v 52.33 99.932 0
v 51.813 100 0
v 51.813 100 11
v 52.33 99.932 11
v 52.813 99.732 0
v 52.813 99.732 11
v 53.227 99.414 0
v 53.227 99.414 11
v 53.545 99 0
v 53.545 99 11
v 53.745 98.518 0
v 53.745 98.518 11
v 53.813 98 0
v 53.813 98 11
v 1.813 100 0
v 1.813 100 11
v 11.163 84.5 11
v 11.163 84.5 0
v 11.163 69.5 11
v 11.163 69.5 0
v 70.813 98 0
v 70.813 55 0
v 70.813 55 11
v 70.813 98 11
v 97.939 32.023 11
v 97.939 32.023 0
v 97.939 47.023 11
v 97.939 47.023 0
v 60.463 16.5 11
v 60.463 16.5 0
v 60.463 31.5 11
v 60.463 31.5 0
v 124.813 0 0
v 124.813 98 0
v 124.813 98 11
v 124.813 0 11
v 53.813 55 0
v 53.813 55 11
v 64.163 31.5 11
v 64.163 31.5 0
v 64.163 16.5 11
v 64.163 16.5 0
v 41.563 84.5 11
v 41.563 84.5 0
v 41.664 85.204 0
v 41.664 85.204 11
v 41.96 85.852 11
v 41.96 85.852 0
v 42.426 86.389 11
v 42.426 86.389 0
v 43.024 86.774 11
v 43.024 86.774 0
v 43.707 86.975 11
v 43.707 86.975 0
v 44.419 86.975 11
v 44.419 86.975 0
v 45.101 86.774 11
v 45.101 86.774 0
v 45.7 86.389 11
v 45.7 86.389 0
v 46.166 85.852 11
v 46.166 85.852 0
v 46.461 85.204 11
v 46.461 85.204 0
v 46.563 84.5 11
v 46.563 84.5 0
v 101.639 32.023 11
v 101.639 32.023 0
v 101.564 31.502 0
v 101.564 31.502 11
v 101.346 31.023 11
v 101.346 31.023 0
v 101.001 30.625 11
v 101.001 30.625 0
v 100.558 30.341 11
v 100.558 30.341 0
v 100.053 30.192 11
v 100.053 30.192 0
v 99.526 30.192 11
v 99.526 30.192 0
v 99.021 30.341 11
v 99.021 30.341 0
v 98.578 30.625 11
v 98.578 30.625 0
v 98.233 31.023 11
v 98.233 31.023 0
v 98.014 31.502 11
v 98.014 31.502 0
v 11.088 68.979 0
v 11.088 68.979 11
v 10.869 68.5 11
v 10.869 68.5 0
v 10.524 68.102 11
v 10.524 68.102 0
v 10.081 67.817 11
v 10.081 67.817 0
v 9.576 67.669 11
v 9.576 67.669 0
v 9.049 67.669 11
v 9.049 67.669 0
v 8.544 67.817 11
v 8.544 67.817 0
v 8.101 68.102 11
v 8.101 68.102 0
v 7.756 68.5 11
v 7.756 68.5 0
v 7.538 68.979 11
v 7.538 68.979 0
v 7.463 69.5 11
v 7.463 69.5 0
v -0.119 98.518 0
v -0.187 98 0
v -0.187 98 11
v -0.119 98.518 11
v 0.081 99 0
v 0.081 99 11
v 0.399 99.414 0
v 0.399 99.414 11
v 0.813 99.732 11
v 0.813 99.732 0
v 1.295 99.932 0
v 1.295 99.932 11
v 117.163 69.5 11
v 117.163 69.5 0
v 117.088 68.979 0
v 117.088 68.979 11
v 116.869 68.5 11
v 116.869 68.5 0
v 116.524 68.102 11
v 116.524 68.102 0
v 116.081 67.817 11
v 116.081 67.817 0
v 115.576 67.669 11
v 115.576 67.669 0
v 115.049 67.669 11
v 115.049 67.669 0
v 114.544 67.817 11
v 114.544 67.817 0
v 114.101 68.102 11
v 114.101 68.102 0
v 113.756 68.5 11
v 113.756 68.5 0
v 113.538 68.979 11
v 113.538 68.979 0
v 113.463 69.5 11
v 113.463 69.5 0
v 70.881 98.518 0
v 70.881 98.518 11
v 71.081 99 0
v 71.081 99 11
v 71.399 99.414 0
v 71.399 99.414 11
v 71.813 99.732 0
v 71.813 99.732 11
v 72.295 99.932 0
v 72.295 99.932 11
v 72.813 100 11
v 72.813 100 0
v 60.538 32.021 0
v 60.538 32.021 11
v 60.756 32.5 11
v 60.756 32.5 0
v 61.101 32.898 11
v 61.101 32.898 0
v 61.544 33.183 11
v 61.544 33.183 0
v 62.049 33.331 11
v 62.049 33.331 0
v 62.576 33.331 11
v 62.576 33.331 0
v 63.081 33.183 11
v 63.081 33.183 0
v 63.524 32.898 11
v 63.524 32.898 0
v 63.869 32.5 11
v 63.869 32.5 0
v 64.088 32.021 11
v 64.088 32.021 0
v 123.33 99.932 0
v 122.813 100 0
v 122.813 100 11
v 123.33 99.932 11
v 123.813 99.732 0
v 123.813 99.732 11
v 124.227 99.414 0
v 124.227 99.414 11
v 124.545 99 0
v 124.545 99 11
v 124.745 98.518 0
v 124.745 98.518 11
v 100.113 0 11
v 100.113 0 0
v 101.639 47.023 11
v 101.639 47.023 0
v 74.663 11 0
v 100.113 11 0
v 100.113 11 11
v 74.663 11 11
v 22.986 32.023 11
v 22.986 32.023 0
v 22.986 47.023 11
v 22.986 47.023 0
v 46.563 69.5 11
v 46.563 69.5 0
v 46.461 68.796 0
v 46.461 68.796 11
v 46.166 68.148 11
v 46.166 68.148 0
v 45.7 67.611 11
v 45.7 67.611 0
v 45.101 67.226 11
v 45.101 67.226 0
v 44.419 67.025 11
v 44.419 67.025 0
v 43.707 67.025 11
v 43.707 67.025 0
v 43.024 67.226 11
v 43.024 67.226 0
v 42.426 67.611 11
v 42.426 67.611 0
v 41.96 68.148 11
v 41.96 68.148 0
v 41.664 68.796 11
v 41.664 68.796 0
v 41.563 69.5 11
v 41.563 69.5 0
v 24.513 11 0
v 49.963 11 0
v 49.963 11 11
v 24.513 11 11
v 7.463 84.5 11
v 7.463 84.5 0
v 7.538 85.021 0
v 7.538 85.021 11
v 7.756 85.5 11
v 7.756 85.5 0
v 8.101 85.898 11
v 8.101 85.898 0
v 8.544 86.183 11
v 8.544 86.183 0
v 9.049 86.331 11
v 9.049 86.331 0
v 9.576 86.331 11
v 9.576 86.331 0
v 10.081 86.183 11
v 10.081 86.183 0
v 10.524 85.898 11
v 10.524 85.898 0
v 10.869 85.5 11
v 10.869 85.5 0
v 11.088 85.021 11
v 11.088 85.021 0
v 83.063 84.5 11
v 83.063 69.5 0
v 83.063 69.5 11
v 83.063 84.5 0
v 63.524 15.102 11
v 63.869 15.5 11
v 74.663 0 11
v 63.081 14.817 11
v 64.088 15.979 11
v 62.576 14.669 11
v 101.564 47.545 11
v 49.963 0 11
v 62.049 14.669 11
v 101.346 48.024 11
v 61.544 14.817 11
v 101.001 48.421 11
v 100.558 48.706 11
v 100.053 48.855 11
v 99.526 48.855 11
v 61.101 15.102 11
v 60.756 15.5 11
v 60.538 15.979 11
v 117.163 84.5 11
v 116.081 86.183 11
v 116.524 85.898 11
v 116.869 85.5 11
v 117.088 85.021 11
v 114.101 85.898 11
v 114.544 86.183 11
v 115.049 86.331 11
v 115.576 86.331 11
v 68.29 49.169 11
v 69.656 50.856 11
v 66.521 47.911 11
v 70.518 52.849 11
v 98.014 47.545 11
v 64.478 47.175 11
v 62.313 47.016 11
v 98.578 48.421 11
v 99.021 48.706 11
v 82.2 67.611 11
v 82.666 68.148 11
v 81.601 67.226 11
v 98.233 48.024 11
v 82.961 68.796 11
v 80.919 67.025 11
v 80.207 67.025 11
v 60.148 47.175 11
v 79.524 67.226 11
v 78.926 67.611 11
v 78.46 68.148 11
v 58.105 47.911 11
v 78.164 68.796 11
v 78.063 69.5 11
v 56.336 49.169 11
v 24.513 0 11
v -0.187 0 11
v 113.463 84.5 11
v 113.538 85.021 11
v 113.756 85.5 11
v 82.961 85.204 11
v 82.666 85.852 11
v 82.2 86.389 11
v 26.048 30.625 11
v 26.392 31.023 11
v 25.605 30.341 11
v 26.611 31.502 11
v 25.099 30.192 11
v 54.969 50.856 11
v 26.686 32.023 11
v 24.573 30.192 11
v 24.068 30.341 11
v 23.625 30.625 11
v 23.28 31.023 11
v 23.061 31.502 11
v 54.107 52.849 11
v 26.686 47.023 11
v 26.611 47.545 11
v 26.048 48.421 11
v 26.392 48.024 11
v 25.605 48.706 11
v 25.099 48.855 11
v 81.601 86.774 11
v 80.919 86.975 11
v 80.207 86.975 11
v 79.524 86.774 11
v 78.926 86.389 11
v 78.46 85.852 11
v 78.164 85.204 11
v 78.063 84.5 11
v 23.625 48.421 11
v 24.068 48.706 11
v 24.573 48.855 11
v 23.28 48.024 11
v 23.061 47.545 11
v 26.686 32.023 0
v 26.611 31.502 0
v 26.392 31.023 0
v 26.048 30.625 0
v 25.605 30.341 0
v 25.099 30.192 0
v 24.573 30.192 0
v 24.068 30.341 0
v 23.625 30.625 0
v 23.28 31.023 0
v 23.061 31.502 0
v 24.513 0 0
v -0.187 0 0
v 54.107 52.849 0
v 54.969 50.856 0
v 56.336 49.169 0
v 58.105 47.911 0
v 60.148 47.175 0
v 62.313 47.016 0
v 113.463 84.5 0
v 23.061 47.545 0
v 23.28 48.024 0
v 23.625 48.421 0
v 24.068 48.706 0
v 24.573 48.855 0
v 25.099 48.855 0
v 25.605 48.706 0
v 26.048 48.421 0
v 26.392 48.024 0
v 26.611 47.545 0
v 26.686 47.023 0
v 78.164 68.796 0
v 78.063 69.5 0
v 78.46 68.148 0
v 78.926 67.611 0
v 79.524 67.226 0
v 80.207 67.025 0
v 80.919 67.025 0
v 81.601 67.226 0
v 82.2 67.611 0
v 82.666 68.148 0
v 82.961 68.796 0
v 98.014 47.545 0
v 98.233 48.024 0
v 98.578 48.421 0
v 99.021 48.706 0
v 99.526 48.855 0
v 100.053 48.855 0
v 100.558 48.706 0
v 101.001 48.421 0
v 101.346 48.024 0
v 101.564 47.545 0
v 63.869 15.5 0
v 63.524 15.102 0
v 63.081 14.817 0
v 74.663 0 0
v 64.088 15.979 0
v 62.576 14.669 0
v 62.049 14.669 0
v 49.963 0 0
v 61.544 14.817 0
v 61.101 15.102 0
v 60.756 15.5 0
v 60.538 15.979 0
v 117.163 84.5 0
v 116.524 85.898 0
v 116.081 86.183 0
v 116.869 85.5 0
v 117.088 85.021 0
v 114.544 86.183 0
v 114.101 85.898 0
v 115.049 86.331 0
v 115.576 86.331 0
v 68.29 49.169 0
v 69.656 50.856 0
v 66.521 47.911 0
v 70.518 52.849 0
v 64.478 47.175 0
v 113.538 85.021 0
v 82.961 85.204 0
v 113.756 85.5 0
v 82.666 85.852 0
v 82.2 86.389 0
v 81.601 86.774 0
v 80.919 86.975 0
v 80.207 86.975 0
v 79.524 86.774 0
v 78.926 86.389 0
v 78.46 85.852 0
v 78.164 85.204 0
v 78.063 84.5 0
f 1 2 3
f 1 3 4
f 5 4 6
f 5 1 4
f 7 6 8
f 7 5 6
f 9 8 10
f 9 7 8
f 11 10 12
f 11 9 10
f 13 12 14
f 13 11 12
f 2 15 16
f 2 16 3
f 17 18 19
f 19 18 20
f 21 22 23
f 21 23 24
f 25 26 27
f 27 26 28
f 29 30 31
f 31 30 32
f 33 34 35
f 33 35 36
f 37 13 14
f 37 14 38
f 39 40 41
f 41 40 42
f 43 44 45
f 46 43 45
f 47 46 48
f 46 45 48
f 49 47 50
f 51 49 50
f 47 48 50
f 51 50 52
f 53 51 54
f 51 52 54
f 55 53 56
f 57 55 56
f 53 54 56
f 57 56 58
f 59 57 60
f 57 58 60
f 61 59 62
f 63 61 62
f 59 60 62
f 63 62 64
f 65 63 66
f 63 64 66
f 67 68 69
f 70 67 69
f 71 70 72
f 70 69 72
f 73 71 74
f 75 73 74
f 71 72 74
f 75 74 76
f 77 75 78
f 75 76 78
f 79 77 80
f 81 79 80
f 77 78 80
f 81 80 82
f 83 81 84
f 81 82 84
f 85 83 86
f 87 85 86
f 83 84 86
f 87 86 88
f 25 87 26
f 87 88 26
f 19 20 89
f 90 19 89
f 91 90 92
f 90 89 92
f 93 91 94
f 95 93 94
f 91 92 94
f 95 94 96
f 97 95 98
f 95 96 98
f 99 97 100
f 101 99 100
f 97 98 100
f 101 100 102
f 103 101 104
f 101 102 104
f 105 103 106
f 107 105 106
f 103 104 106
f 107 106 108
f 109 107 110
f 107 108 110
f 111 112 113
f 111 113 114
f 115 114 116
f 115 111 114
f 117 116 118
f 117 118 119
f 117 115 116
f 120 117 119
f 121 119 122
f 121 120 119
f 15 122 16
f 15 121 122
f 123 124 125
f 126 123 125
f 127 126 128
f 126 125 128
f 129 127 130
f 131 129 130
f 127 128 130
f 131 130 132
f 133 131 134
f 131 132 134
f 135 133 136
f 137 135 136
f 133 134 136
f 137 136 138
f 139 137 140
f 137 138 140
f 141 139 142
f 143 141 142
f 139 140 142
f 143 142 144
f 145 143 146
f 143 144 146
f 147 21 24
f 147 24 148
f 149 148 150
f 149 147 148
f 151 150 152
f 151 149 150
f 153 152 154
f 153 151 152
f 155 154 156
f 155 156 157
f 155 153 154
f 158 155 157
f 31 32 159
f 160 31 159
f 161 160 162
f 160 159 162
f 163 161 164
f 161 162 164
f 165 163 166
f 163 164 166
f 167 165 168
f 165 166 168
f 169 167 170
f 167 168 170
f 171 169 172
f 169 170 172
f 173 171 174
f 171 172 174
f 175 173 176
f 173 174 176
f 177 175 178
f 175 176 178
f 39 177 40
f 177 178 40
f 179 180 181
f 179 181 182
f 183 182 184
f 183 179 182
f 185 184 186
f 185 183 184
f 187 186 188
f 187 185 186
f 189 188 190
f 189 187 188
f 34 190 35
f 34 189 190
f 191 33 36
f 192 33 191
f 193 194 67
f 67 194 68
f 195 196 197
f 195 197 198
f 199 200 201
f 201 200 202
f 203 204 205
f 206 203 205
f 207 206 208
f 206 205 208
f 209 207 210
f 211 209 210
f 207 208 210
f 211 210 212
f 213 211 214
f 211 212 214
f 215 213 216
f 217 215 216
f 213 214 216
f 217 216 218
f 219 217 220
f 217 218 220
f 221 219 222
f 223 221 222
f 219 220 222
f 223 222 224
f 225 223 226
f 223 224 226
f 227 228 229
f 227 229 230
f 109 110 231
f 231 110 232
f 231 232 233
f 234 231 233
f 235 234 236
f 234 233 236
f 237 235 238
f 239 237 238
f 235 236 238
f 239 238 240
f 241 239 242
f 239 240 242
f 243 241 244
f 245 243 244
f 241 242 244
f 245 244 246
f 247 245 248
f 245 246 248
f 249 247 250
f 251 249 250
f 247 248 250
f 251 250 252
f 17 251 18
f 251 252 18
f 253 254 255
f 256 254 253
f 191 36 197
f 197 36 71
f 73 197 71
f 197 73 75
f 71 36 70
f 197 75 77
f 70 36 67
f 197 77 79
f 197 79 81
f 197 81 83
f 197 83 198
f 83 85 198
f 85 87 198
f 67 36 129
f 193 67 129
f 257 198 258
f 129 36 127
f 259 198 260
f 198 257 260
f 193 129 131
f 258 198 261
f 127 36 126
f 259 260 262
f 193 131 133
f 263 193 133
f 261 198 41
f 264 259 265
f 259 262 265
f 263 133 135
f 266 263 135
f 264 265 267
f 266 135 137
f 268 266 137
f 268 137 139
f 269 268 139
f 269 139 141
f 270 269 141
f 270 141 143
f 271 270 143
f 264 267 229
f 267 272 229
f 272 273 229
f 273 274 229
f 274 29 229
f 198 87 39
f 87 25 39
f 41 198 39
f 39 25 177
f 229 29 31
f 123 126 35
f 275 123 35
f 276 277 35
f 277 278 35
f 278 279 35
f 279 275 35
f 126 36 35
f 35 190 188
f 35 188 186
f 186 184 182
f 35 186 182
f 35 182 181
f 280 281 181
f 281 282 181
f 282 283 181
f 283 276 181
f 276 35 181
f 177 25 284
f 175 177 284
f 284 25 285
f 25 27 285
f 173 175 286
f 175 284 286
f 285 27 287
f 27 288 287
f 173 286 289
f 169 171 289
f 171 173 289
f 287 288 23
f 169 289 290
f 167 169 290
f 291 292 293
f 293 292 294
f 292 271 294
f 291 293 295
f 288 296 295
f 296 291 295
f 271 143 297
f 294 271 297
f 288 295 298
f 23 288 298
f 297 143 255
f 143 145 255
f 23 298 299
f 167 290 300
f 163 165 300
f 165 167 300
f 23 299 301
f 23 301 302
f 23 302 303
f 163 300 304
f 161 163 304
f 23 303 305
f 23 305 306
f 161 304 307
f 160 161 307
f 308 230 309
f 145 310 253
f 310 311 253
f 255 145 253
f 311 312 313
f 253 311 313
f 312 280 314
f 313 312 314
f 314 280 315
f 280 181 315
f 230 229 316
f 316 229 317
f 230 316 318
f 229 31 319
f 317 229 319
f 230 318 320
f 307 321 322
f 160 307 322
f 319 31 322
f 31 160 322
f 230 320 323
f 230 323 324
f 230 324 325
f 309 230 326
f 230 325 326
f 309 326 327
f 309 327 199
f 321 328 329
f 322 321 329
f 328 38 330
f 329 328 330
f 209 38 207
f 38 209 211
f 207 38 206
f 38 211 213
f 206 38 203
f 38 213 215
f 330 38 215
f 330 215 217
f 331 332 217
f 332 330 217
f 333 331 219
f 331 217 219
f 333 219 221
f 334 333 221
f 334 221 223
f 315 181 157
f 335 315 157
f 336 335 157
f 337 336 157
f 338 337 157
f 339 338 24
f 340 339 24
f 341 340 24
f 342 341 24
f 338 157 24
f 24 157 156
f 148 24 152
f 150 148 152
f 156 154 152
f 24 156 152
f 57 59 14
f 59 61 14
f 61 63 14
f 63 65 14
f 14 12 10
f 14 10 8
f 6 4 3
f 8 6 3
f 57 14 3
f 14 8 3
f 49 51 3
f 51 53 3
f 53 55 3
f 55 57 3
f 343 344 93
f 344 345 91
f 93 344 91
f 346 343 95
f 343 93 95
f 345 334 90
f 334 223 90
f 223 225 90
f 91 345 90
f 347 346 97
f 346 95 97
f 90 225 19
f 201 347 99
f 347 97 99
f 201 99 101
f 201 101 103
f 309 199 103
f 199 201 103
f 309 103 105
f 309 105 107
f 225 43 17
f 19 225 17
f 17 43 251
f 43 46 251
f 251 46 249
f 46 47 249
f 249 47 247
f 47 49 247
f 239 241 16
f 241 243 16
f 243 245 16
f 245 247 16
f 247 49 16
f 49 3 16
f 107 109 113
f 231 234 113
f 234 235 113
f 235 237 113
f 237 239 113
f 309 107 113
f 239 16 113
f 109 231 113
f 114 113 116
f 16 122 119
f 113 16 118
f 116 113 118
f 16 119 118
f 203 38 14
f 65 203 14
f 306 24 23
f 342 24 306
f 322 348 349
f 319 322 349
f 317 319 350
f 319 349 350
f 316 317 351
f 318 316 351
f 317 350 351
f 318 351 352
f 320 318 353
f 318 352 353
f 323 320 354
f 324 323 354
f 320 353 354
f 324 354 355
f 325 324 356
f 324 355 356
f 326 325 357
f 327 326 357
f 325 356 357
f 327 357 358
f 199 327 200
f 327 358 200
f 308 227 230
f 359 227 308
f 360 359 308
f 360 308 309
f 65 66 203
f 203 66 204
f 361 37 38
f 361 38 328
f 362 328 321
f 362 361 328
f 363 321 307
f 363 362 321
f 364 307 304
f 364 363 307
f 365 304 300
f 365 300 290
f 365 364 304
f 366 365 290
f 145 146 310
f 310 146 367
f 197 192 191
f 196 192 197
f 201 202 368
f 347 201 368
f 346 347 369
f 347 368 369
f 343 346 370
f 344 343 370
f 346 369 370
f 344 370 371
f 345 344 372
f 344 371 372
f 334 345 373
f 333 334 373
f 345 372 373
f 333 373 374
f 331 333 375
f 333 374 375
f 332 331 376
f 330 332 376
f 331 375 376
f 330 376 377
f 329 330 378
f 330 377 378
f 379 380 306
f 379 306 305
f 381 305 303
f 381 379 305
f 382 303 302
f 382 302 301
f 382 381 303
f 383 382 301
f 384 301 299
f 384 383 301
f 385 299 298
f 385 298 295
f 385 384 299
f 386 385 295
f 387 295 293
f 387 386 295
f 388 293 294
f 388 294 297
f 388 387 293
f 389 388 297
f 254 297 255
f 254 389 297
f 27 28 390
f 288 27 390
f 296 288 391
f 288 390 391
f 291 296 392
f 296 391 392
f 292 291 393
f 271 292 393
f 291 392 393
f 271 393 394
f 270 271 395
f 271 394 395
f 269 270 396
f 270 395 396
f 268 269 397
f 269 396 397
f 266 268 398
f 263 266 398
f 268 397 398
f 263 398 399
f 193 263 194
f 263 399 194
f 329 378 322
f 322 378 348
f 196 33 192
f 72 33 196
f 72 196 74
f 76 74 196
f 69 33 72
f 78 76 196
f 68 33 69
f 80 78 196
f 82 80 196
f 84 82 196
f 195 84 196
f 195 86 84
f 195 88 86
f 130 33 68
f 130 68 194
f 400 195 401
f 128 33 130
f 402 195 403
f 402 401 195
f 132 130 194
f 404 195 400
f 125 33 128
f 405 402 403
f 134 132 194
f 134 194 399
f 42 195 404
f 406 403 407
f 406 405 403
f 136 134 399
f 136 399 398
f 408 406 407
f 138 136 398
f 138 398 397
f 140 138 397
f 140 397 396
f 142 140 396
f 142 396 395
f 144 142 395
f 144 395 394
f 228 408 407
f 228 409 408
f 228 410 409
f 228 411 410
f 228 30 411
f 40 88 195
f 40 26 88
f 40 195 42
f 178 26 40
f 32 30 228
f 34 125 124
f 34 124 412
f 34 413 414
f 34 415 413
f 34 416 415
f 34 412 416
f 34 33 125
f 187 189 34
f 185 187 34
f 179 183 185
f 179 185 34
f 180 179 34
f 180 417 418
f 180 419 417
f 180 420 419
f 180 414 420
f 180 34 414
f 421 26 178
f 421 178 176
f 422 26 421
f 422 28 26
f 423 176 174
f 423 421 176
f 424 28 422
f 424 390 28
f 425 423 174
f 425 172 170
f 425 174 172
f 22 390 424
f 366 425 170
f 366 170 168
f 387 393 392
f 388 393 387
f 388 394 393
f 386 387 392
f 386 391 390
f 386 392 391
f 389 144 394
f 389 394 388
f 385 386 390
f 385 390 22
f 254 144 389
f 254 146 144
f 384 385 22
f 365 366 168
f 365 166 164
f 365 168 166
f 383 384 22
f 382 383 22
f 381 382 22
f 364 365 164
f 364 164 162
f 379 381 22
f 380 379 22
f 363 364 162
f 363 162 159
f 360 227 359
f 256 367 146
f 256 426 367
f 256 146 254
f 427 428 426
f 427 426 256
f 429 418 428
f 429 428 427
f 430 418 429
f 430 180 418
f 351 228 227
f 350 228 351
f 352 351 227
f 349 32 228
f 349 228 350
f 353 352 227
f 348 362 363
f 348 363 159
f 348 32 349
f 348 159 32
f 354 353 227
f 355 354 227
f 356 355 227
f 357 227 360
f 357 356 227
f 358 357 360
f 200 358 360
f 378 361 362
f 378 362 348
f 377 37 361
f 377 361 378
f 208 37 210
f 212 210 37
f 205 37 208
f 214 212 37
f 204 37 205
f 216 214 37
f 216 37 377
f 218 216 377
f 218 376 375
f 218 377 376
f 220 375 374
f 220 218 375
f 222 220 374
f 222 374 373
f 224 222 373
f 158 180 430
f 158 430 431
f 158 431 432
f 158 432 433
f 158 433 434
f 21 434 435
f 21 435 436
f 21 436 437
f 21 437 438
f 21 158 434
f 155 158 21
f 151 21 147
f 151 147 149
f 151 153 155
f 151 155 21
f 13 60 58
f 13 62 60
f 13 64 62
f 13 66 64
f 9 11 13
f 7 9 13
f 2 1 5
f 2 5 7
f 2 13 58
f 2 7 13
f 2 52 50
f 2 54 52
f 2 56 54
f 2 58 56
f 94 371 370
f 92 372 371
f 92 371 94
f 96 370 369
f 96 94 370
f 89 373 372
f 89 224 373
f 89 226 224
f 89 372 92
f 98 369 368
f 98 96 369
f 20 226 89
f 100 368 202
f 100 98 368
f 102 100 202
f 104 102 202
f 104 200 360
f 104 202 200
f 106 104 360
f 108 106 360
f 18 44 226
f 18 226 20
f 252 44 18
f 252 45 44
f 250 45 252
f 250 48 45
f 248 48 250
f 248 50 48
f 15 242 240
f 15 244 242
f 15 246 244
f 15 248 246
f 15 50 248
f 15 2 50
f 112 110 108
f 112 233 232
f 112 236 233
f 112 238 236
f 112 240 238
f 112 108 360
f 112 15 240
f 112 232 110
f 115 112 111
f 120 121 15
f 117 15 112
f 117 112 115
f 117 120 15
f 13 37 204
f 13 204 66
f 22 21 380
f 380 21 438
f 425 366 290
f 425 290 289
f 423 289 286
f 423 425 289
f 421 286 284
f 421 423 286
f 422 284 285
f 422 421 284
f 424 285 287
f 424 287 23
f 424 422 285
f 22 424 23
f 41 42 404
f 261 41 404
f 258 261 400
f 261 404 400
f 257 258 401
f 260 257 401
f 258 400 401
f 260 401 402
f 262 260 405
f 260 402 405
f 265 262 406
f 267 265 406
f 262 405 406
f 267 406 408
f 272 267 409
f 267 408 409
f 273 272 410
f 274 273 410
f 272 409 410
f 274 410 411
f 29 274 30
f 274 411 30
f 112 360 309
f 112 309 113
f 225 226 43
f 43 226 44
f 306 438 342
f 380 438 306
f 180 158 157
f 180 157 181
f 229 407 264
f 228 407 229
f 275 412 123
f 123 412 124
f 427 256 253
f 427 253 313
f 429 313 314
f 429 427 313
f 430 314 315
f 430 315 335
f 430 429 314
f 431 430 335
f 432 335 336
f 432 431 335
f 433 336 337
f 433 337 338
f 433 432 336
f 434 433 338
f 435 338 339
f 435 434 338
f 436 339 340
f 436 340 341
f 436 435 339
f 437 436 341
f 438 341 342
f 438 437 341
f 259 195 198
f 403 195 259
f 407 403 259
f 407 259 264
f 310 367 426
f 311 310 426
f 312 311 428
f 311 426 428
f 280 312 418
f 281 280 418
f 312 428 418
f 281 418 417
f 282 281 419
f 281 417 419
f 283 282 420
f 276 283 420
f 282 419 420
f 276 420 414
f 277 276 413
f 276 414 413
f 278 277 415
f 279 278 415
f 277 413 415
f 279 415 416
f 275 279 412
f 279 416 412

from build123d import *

# Parameters (mm, degrees)
BOSS_EXTRUDE7_DEPTH = 11


with BuildPart() as part:
    # Sketch2 → Boss-Extrude7 (new body)
    with BuildSketch(Plane.XY):
        with BuildLine():
            Line((-0.187241808, 0), (-0.187241808, 98))
            ThreePointArc((-0.187241808, 98), (0.39854463, 99.414213562), (1.812758192, 100))
            Line((1.812758192, 100), (51.812758192, 100))
            ThreePointArc((51.812758192, 100), (53.226971755, 99.414213562), (53.812758192, 98))
            Line((53.812758192, 98), (53.812758192, 55))
            ThreePointArc((53.812758192, 55), (56.335532617, 49.169048105), (62.312758192, 47.015640289))
            ThreePointArc((62.312758192, 47.015640289), (68.289983767, 49.169048105), (70.812758192, 55))
            Line((70.812758192, 55), (70.812758192, 98))
            ThreePointArc((70.812758192, 98), (71.39854463, 99.414213562), (72.812758192, 100))
            Line((72.812758192, 100), (122.812758192, 100))
            ThreePointArc((122.812758192, 100), (124.226971755, 99.414213562), (124.812758192, 98))
            Line((124.812758192, 98), (124.812758192, 0))
            Line((124.812758192, 0), (100.112758192, 0))
            Line((100.112758192, 0), (100.112758192, 11))
            Line((100.112758192, 11), (74.662758192, 11))
            Line((74.662758192, 11), (74.662758192, 0))
            Line((74.662758192, 0), (49.962758192, 0))
            Line((49.962758192, 0), (49.962758192, 11))
            Line((49.962758192, 11), (24.512758192, 11))
            Line((24.512758192, 11), (24.512758192, 0))
            Line((24.512758192, 0), (-0.187241808, 0))
        make_face()
        with BuildLine():
            Line((41.562758192, 69.5), (41.562758192, 84.5))
            ThreePointArc((41.562758192, 84.5), (44.062758192, 87), (46.562758192, 84.5))
            Line((46.562758192, 84.5), (46.562758192, 69.5))
            ThreePointArc((46.562758192, 69.5), (44.062758192, 67), (41.562758192, 69.5))
        make_face(mode=Mode.SUBTRACT)
        with BuildLine():
            Line((83.062758192, 69.5), (83.062758192, 84.5))
            ThreePointArc((83.062758192, 84.5), (80.562758192, 87), (78.062758192, 84.5))
            Line((78.062758192, 84.5), (78.062758192, 69.5))
            ThreePointArc((78.062758192, 69.5), (80.562758192, 67), (83.062758192, 69.5))
        make_face(mode=Mode.SUBTRACT)
        with BuildLine():
            Line((7.462758192, 69.5), (7.462758192, 84.5))
            ThreePointArc((7.462758192, 84.5), (9.312758192, 86.35), (11.162758192, 84.5))
            Line((11.162758192, 84.5), (11.162758192, 69.5))
            ThreePointArc((11.162758192, 69.5), (9.312758192, 67.65), (7.462758192, 69.5))
        make_face(mode=Mode.SUBTRACT)
        with BuildLine():
            Line((22.986098789, 32.023340597), (22.986098789, 47.023340597))
            ThreePointArc((22.986098789, 47.023340597), (24.836098789, 48.873340597), (26.686098789, 47.023340597))
            Line((26.686098789, 47.023340597), (26.686098789, 32.023340597))
            ThreePointArc((26.686098789, 32.023340597), (24.836098789, 30.173340597), (22.986098789, 32.023340597))
        make_face(mode=Mode.SUBTRACT)
        with BuildLine():
            Line((60.462758192, 16.5), (60.462758192, 31.5))
            ThreePointArc((60.462758192, 31.5), (62.312758192, 33.35), (64.162758192, 31.5))
            Line((64.162758192, 31.5), (64.162758192, 16.5))
            ThreePointArc((64.162758192, 16.5), (62.312758192, 14.65), (60.462758192, 16.5))
        make_face(mode=Mode.SUBTRACT)
        with BuildLine():
            Line((97.939417595, 32.023340597), (97.939417595, 47.023340597))
            ThreePointArc((97.939417595, 47.023340597), (99.789417595, 48.873340597), (101.639417595, 47.023340597))
            Line((101.639417595, 47.023340597), (101.639417595, 32.023340597))
            ThreePointArc((101.639417595, 32.023340597), (99.789417595, 30.173340597), (97.939417595, 32.023340597))
        make_face(mode=Mode.SUBTRACT)
        with BuildLine():
            Line((113.462758192, 69.5), (113.462758192, 84.5))
            ThreePointArc((113.462758192, 84.5), (115.312758192, 86.35), (117.162758192, 84.5))
            Line((117.162758192, 84.5), (117.162758192, 69.5))
            ThreePointArc((117.162758192, 69.5), (115.312758192, 67.65), (113.462758192, 69.5))
        make_face(mode=Mode.SUBTRACT)
    extrude(amount=BOSS_EXTRUDE7_DEPTH)


solid = part.part
